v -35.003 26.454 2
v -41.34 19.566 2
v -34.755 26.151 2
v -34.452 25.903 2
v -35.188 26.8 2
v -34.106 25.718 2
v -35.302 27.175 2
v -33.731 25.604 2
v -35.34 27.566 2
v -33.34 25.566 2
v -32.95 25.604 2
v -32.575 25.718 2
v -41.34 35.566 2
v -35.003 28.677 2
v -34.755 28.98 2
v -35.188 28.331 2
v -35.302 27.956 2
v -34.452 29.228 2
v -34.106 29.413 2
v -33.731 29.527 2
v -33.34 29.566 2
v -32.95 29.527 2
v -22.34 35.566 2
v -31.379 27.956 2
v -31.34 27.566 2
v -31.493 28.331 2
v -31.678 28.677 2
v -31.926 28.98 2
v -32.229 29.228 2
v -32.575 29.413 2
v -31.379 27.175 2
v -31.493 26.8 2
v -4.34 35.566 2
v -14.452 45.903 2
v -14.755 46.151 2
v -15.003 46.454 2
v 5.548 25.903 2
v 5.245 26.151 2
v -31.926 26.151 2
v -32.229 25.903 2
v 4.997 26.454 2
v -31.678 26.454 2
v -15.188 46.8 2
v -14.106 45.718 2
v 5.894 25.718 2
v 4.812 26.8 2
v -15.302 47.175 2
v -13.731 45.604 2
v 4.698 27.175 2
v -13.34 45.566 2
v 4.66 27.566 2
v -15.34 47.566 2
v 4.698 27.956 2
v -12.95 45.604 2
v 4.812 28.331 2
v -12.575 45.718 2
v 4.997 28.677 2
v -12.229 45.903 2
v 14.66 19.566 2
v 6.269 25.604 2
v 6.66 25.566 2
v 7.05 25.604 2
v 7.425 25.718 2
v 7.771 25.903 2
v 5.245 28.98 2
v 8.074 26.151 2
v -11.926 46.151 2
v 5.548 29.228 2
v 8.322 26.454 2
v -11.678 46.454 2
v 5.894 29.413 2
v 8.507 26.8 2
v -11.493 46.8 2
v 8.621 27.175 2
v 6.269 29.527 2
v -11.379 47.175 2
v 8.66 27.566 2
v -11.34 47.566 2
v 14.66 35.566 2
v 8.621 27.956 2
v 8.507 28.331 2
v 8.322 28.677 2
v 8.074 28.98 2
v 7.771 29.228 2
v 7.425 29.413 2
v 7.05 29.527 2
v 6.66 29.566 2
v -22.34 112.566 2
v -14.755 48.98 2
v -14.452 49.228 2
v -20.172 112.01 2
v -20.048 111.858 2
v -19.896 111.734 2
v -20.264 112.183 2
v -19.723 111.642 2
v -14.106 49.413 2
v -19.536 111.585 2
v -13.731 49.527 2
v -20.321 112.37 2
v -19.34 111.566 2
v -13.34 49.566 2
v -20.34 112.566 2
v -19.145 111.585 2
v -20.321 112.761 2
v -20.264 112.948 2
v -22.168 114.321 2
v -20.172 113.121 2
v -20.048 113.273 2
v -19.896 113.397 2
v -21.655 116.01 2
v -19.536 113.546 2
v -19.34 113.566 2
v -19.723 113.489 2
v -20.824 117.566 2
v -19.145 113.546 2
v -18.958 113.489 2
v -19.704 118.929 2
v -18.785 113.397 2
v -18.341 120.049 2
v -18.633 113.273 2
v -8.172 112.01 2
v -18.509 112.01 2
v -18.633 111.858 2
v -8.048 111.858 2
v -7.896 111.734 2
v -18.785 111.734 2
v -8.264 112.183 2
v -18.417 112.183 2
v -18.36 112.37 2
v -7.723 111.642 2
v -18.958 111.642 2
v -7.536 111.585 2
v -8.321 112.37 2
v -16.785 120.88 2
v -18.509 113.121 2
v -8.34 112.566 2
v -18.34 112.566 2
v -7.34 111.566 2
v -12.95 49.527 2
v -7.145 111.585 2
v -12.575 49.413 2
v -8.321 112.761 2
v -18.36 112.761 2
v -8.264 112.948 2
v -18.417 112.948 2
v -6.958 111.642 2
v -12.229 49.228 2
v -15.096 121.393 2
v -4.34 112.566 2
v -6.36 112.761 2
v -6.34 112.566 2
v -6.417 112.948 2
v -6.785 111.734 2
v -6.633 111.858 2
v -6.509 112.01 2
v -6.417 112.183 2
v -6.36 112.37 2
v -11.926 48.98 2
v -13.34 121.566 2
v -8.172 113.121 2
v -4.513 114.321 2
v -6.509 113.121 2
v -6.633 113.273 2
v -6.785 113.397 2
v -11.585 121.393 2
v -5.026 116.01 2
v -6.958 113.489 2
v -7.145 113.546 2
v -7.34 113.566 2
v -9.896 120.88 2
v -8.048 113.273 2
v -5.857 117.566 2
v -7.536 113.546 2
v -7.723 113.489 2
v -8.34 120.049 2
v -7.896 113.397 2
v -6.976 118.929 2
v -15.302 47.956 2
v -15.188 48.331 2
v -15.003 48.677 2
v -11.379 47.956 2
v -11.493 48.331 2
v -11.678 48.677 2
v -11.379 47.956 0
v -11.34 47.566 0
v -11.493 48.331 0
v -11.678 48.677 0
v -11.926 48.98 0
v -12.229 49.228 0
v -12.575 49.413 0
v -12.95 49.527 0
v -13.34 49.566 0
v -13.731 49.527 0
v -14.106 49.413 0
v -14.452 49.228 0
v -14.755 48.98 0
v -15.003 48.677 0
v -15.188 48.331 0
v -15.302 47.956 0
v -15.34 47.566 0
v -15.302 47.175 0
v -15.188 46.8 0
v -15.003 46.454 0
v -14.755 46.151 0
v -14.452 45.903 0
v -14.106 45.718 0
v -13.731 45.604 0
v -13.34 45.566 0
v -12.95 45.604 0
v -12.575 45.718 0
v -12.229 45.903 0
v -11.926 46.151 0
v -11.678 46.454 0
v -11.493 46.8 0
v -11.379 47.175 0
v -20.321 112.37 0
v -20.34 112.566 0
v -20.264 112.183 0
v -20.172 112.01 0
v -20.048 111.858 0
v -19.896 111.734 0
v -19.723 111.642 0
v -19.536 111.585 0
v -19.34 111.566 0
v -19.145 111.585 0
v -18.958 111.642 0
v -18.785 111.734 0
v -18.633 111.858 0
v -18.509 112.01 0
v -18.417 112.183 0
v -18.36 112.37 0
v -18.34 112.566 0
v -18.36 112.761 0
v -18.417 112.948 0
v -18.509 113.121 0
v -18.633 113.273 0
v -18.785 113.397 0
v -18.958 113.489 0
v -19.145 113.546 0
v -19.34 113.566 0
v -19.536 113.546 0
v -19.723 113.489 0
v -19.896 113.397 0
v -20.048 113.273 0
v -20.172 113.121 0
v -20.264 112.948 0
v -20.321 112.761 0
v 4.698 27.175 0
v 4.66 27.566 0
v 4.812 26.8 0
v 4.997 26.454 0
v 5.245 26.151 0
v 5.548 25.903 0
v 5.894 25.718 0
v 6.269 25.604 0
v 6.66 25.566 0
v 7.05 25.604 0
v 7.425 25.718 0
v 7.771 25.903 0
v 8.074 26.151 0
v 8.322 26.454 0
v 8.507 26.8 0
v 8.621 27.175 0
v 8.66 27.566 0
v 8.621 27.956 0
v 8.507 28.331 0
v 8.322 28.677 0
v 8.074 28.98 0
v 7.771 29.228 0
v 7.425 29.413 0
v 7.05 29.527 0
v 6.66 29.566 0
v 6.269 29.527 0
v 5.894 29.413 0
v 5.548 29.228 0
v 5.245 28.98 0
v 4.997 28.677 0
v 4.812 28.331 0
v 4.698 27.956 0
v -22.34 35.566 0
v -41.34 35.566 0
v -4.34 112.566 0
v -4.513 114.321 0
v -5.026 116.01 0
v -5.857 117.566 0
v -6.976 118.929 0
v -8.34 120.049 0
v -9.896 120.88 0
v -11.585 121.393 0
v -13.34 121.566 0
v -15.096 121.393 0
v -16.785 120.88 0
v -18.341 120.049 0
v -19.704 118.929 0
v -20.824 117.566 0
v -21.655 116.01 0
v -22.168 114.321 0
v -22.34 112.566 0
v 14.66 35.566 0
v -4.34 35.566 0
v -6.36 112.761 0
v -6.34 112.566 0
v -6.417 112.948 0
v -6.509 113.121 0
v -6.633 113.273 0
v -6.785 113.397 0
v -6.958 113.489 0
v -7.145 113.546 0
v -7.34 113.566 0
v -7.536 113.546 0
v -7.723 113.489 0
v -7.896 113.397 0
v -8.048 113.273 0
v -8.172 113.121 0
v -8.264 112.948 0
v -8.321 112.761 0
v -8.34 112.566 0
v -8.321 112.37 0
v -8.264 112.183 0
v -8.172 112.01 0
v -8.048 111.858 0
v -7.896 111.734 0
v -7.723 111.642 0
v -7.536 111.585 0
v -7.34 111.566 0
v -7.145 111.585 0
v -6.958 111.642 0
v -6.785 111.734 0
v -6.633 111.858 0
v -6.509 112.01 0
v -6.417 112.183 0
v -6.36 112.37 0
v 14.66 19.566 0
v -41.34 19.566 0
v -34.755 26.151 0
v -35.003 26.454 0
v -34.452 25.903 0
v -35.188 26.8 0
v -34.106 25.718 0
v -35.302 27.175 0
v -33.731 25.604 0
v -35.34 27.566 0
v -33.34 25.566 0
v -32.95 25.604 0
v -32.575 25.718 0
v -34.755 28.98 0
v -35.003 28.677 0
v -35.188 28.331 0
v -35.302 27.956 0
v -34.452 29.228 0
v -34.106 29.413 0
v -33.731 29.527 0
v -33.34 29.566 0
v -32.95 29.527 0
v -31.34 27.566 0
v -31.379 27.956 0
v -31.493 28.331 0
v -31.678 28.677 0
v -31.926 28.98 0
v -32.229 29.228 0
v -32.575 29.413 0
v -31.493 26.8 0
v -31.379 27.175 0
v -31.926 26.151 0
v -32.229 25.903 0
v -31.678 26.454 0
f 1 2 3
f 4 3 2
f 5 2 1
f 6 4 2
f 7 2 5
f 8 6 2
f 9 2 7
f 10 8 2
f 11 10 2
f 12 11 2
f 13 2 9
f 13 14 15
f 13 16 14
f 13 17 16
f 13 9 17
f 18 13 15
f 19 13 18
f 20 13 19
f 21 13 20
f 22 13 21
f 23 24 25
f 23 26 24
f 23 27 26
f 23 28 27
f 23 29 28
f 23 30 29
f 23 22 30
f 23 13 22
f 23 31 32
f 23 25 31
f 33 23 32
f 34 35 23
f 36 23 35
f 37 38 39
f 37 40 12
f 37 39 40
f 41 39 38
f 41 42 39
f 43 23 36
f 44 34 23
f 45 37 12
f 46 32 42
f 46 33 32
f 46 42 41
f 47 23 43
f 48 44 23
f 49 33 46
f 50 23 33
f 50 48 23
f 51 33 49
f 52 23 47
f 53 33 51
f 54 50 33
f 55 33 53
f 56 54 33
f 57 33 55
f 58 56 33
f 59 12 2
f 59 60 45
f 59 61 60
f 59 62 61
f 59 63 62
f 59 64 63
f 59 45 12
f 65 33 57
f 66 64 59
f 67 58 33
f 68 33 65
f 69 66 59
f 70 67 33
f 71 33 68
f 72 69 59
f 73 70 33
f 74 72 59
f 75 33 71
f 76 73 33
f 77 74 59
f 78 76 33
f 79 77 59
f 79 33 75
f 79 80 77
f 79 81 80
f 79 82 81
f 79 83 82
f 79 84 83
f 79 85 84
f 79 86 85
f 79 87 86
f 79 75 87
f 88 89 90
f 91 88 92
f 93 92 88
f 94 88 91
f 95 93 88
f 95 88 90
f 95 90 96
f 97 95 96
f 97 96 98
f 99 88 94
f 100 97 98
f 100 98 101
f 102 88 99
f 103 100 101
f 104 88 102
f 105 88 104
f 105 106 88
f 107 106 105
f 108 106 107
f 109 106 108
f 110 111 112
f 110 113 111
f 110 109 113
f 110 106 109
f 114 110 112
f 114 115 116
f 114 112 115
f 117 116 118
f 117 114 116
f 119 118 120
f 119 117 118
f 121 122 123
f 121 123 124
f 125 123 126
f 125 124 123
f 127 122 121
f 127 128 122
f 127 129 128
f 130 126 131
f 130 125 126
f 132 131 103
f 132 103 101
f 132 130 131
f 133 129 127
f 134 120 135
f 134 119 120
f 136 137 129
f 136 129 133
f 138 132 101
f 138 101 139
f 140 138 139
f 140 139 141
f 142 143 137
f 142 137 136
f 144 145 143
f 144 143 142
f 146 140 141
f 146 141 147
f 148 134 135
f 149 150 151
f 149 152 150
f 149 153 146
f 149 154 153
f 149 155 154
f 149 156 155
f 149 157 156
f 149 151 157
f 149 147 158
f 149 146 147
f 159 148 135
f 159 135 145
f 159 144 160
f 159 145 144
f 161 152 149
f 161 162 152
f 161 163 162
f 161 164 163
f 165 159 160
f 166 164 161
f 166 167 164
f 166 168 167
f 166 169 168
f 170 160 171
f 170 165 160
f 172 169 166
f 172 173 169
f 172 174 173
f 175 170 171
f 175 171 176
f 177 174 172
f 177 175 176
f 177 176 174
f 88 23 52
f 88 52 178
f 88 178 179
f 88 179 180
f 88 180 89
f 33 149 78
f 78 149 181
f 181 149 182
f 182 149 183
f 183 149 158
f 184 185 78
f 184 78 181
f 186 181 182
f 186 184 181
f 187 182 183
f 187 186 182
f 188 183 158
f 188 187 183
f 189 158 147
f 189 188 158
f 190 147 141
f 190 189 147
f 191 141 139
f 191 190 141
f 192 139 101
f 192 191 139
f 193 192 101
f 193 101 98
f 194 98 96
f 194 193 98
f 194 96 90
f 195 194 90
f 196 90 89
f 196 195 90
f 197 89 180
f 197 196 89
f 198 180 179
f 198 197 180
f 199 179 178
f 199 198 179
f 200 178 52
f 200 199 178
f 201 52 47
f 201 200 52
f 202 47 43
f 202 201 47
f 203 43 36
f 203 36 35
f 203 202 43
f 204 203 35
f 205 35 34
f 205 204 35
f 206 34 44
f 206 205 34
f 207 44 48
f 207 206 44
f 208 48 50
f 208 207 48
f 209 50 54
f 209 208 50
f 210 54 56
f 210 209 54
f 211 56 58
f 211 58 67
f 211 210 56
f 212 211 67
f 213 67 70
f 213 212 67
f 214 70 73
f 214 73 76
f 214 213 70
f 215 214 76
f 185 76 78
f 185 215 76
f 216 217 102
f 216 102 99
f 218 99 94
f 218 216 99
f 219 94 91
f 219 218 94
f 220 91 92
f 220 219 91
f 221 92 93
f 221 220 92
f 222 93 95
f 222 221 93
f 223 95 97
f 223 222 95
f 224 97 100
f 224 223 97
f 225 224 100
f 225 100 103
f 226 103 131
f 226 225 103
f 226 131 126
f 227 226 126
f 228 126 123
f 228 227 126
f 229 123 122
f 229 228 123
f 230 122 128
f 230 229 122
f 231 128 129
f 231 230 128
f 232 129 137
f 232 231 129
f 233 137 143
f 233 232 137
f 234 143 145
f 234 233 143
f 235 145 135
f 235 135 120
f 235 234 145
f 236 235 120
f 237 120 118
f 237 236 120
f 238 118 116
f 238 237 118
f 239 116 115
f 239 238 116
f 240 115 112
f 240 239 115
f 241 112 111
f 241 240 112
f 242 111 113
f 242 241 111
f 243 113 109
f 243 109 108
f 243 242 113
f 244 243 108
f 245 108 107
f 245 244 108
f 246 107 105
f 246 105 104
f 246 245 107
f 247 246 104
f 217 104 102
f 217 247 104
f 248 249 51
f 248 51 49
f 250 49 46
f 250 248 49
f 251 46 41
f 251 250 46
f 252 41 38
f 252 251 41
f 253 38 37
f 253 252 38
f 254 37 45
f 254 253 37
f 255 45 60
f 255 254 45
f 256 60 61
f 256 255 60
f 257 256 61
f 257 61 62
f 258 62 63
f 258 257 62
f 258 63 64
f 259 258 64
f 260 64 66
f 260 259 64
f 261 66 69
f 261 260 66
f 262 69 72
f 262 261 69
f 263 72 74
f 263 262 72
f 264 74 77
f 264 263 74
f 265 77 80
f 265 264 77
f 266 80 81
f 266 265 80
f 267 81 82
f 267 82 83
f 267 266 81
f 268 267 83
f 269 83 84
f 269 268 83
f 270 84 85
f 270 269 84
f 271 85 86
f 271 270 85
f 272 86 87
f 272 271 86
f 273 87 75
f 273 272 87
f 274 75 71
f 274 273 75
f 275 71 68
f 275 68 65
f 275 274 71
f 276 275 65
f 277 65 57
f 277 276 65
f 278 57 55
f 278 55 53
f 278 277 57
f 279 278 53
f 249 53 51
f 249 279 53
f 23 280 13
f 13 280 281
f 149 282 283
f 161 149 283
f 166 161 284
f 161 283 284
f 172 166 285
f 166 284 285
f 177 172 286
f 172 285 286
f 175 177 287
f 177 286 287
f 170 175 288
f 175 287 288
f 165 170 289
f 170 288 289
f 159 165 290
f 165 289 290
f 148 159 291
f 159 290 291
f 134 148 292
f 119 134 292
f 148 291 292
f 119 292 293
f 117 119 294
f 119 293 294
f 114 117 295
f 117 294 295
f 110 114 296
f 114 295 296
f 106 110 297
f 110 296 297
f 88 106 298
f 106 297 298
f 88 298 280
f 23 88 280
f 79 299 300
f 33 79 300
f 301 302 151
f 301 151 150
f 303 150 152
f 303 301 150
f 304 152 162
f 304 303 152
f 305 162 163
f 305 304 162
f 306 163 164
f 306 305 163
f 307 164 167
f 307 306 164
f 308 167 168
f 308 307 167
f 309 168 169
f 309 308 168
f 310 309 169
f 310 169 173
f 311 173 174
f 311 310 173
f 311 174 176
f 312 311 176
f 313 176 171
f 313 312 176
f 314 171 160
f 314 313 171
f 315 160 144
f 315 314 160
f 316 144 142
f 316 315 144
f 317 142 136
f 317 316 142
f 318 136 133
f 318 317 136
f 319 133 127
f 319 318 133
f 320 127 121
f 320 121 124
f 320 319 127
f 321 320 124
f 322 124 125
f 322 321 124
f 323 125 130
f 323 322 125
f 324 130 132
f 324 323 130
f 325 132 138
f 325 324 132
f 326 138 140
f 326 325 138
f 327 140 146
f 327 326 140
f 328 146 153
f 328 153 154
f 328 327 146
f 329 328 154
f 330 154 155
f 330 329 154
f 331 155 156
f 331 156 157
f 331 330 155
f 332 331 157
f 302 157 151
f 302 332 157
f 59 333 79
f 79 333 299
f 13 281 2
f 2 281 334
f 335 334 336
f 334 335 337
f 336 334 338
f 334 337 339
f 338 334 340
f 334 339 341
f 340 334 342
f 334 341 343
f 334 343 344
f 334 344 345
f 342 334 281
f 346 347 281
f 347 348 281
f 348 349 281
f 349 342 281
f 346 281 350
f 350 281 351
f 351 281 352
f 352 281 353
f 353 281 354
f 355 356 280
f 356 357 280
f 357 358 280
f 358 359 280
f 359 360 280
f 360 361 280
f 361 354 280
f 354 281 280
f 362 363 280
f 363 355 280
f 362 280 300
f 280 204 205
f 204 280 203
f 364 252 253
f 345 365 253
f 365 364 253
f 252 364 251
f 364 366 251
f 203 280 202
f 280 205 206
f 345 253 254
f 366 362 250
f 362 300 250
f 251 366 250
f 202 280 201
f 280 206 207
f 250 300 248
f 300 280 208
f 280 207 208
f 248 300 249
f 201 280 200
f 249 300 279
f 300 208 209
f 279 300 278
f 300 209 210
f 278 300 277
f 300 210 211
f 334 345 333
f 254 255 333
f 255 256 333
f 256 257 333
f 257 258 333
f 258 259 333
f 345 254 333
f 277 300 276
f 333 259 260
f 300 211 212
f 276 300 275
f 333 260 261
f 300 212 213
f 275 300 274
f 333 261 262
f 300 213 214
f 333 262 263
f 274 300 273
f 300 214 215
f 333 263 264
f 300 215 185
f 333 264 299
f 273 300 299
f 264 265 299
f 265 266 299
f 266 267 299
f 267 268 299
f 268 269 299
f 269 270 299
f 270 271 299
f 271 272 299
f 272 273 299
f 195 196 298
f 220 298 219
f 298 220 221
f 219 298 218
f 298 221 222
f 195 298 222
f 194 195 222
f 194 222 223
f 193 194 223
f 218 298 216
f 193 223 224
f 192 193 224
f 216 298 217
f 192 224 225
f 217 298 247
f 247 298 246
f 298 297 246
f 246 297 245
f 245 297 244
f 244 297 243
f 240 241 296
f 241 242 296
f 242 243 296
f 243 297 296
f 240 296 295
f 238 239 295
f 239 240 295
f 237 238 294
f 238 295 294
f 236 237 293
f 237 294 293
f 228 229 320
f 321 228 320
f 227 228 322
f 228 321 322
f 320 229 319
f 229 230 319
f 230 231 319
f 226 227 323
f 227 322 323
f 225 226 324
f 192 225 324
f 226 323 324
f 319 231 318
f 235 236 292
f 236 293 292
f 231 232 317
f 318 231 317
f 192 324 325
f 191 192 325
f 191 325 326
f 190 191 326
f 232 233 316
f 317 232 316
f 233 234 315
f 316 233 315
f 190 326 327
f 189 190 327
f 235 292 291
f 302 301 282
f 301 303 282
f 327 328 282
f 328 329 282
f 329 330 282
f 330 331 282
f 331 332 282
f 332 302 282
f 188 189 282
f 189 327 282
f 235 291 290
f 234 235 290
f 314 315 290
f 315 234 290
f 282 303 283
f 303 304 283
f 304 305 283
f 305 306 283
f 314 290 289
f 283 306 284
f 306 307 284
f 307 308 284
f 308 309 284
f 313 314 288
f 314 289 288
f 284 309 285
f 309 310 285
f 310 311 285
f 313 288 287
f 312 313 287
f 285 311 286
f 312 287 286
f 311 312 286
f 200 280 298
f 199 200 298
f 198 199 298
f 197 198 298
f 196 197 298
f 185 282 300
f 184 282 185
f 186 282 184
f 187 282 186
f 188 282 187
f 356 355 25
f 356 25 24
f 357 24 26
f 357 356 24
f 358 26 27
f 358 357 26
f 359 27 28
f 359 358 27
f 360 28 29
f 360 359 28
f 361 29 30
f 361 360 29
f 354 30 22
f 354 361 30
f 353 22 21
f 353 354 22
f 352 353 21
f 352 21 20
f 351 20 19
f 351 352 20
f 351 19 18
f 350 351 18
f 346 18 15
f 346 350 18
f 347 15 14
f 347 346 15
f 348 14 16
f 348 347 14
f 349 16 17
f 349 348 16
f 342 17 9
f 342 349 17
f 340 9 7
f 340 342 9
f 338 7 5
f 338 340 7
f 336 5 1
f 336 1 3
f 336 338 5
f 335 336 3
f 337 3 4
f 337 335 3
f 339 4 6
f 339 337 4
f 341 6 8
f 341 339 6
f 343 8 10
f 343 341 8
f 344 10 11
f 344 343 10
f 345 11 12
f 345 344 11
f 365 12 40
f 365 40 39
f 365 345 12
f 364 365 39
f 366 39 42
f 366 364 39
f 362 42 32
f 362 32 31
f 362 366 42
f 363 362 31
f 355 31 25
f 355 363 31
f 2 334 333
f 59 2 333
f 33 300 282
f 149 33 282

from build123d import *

# Parameters (mm, degrees)
SKETCH_1_R      = 2
SKETCH_1_R_2    = 1
EXTRUDE_1_DEPTH = 2


with BuildPart() as part:
    # 草图1 → 凸台-拉伸1 (new body)
    with BuildSketch(Plane.XY):
        with BuildLine():
            Line((-22.340449028, 112.565520938), (-22.340449028, 35.565520938))
            Line((-22.340449028, 35.565520938), (-41.340449028, 35.565520938))
            Line((-41.340449028, 35.565520938), (-41.340449028, 19.565520938))
            Line((-41.340449028, 19.565520938), (14.659550972, 19.565520938))
            Line((14.659550972, 19.565520938), (14.659550972, 35.565520938))
            Line((14.659550972, 35.565520938), (-4.340449028, 35.565520938))
            Line((-4.340449028, 35.565520938), (-4.340449028, 112.565520938))
            ThreePointArc((-4.340449028, 112.565520938), (-13.340449028, 121.565520938), (-22.340449028, 112.565520938))
        make_face()
        with Locations((-33.340449028, 27.565520938)):
            Circle(SKETCH_1_R, mode=Mode.SUBTRACT)
        with Locations(Location((6.659550972, 27.565520938, 0), (0, 0, 180))):
            Circle(SKETCH_1_R, mode=Mode.SUBTRACT)
        with Locations((-7.340449028, 112.565520938)):
            Circle(SKETCH_1_R_2, mode=Mode.SUBTRACT)
        with Locations(Location((-19.340449028, 112.565520938, 0), (0, 0, 180))):
            Circle(SKETCH_1_R_2, mode=Mode.SUBTRACT)
        with Locations((-13.340449028, 47.565520938)):
            Circle(SKETCH_1_R, mode=Mode.SUBTRACT)
    extrude(amount=EXTRUDE_1_DEPTH)


solid = part.part
